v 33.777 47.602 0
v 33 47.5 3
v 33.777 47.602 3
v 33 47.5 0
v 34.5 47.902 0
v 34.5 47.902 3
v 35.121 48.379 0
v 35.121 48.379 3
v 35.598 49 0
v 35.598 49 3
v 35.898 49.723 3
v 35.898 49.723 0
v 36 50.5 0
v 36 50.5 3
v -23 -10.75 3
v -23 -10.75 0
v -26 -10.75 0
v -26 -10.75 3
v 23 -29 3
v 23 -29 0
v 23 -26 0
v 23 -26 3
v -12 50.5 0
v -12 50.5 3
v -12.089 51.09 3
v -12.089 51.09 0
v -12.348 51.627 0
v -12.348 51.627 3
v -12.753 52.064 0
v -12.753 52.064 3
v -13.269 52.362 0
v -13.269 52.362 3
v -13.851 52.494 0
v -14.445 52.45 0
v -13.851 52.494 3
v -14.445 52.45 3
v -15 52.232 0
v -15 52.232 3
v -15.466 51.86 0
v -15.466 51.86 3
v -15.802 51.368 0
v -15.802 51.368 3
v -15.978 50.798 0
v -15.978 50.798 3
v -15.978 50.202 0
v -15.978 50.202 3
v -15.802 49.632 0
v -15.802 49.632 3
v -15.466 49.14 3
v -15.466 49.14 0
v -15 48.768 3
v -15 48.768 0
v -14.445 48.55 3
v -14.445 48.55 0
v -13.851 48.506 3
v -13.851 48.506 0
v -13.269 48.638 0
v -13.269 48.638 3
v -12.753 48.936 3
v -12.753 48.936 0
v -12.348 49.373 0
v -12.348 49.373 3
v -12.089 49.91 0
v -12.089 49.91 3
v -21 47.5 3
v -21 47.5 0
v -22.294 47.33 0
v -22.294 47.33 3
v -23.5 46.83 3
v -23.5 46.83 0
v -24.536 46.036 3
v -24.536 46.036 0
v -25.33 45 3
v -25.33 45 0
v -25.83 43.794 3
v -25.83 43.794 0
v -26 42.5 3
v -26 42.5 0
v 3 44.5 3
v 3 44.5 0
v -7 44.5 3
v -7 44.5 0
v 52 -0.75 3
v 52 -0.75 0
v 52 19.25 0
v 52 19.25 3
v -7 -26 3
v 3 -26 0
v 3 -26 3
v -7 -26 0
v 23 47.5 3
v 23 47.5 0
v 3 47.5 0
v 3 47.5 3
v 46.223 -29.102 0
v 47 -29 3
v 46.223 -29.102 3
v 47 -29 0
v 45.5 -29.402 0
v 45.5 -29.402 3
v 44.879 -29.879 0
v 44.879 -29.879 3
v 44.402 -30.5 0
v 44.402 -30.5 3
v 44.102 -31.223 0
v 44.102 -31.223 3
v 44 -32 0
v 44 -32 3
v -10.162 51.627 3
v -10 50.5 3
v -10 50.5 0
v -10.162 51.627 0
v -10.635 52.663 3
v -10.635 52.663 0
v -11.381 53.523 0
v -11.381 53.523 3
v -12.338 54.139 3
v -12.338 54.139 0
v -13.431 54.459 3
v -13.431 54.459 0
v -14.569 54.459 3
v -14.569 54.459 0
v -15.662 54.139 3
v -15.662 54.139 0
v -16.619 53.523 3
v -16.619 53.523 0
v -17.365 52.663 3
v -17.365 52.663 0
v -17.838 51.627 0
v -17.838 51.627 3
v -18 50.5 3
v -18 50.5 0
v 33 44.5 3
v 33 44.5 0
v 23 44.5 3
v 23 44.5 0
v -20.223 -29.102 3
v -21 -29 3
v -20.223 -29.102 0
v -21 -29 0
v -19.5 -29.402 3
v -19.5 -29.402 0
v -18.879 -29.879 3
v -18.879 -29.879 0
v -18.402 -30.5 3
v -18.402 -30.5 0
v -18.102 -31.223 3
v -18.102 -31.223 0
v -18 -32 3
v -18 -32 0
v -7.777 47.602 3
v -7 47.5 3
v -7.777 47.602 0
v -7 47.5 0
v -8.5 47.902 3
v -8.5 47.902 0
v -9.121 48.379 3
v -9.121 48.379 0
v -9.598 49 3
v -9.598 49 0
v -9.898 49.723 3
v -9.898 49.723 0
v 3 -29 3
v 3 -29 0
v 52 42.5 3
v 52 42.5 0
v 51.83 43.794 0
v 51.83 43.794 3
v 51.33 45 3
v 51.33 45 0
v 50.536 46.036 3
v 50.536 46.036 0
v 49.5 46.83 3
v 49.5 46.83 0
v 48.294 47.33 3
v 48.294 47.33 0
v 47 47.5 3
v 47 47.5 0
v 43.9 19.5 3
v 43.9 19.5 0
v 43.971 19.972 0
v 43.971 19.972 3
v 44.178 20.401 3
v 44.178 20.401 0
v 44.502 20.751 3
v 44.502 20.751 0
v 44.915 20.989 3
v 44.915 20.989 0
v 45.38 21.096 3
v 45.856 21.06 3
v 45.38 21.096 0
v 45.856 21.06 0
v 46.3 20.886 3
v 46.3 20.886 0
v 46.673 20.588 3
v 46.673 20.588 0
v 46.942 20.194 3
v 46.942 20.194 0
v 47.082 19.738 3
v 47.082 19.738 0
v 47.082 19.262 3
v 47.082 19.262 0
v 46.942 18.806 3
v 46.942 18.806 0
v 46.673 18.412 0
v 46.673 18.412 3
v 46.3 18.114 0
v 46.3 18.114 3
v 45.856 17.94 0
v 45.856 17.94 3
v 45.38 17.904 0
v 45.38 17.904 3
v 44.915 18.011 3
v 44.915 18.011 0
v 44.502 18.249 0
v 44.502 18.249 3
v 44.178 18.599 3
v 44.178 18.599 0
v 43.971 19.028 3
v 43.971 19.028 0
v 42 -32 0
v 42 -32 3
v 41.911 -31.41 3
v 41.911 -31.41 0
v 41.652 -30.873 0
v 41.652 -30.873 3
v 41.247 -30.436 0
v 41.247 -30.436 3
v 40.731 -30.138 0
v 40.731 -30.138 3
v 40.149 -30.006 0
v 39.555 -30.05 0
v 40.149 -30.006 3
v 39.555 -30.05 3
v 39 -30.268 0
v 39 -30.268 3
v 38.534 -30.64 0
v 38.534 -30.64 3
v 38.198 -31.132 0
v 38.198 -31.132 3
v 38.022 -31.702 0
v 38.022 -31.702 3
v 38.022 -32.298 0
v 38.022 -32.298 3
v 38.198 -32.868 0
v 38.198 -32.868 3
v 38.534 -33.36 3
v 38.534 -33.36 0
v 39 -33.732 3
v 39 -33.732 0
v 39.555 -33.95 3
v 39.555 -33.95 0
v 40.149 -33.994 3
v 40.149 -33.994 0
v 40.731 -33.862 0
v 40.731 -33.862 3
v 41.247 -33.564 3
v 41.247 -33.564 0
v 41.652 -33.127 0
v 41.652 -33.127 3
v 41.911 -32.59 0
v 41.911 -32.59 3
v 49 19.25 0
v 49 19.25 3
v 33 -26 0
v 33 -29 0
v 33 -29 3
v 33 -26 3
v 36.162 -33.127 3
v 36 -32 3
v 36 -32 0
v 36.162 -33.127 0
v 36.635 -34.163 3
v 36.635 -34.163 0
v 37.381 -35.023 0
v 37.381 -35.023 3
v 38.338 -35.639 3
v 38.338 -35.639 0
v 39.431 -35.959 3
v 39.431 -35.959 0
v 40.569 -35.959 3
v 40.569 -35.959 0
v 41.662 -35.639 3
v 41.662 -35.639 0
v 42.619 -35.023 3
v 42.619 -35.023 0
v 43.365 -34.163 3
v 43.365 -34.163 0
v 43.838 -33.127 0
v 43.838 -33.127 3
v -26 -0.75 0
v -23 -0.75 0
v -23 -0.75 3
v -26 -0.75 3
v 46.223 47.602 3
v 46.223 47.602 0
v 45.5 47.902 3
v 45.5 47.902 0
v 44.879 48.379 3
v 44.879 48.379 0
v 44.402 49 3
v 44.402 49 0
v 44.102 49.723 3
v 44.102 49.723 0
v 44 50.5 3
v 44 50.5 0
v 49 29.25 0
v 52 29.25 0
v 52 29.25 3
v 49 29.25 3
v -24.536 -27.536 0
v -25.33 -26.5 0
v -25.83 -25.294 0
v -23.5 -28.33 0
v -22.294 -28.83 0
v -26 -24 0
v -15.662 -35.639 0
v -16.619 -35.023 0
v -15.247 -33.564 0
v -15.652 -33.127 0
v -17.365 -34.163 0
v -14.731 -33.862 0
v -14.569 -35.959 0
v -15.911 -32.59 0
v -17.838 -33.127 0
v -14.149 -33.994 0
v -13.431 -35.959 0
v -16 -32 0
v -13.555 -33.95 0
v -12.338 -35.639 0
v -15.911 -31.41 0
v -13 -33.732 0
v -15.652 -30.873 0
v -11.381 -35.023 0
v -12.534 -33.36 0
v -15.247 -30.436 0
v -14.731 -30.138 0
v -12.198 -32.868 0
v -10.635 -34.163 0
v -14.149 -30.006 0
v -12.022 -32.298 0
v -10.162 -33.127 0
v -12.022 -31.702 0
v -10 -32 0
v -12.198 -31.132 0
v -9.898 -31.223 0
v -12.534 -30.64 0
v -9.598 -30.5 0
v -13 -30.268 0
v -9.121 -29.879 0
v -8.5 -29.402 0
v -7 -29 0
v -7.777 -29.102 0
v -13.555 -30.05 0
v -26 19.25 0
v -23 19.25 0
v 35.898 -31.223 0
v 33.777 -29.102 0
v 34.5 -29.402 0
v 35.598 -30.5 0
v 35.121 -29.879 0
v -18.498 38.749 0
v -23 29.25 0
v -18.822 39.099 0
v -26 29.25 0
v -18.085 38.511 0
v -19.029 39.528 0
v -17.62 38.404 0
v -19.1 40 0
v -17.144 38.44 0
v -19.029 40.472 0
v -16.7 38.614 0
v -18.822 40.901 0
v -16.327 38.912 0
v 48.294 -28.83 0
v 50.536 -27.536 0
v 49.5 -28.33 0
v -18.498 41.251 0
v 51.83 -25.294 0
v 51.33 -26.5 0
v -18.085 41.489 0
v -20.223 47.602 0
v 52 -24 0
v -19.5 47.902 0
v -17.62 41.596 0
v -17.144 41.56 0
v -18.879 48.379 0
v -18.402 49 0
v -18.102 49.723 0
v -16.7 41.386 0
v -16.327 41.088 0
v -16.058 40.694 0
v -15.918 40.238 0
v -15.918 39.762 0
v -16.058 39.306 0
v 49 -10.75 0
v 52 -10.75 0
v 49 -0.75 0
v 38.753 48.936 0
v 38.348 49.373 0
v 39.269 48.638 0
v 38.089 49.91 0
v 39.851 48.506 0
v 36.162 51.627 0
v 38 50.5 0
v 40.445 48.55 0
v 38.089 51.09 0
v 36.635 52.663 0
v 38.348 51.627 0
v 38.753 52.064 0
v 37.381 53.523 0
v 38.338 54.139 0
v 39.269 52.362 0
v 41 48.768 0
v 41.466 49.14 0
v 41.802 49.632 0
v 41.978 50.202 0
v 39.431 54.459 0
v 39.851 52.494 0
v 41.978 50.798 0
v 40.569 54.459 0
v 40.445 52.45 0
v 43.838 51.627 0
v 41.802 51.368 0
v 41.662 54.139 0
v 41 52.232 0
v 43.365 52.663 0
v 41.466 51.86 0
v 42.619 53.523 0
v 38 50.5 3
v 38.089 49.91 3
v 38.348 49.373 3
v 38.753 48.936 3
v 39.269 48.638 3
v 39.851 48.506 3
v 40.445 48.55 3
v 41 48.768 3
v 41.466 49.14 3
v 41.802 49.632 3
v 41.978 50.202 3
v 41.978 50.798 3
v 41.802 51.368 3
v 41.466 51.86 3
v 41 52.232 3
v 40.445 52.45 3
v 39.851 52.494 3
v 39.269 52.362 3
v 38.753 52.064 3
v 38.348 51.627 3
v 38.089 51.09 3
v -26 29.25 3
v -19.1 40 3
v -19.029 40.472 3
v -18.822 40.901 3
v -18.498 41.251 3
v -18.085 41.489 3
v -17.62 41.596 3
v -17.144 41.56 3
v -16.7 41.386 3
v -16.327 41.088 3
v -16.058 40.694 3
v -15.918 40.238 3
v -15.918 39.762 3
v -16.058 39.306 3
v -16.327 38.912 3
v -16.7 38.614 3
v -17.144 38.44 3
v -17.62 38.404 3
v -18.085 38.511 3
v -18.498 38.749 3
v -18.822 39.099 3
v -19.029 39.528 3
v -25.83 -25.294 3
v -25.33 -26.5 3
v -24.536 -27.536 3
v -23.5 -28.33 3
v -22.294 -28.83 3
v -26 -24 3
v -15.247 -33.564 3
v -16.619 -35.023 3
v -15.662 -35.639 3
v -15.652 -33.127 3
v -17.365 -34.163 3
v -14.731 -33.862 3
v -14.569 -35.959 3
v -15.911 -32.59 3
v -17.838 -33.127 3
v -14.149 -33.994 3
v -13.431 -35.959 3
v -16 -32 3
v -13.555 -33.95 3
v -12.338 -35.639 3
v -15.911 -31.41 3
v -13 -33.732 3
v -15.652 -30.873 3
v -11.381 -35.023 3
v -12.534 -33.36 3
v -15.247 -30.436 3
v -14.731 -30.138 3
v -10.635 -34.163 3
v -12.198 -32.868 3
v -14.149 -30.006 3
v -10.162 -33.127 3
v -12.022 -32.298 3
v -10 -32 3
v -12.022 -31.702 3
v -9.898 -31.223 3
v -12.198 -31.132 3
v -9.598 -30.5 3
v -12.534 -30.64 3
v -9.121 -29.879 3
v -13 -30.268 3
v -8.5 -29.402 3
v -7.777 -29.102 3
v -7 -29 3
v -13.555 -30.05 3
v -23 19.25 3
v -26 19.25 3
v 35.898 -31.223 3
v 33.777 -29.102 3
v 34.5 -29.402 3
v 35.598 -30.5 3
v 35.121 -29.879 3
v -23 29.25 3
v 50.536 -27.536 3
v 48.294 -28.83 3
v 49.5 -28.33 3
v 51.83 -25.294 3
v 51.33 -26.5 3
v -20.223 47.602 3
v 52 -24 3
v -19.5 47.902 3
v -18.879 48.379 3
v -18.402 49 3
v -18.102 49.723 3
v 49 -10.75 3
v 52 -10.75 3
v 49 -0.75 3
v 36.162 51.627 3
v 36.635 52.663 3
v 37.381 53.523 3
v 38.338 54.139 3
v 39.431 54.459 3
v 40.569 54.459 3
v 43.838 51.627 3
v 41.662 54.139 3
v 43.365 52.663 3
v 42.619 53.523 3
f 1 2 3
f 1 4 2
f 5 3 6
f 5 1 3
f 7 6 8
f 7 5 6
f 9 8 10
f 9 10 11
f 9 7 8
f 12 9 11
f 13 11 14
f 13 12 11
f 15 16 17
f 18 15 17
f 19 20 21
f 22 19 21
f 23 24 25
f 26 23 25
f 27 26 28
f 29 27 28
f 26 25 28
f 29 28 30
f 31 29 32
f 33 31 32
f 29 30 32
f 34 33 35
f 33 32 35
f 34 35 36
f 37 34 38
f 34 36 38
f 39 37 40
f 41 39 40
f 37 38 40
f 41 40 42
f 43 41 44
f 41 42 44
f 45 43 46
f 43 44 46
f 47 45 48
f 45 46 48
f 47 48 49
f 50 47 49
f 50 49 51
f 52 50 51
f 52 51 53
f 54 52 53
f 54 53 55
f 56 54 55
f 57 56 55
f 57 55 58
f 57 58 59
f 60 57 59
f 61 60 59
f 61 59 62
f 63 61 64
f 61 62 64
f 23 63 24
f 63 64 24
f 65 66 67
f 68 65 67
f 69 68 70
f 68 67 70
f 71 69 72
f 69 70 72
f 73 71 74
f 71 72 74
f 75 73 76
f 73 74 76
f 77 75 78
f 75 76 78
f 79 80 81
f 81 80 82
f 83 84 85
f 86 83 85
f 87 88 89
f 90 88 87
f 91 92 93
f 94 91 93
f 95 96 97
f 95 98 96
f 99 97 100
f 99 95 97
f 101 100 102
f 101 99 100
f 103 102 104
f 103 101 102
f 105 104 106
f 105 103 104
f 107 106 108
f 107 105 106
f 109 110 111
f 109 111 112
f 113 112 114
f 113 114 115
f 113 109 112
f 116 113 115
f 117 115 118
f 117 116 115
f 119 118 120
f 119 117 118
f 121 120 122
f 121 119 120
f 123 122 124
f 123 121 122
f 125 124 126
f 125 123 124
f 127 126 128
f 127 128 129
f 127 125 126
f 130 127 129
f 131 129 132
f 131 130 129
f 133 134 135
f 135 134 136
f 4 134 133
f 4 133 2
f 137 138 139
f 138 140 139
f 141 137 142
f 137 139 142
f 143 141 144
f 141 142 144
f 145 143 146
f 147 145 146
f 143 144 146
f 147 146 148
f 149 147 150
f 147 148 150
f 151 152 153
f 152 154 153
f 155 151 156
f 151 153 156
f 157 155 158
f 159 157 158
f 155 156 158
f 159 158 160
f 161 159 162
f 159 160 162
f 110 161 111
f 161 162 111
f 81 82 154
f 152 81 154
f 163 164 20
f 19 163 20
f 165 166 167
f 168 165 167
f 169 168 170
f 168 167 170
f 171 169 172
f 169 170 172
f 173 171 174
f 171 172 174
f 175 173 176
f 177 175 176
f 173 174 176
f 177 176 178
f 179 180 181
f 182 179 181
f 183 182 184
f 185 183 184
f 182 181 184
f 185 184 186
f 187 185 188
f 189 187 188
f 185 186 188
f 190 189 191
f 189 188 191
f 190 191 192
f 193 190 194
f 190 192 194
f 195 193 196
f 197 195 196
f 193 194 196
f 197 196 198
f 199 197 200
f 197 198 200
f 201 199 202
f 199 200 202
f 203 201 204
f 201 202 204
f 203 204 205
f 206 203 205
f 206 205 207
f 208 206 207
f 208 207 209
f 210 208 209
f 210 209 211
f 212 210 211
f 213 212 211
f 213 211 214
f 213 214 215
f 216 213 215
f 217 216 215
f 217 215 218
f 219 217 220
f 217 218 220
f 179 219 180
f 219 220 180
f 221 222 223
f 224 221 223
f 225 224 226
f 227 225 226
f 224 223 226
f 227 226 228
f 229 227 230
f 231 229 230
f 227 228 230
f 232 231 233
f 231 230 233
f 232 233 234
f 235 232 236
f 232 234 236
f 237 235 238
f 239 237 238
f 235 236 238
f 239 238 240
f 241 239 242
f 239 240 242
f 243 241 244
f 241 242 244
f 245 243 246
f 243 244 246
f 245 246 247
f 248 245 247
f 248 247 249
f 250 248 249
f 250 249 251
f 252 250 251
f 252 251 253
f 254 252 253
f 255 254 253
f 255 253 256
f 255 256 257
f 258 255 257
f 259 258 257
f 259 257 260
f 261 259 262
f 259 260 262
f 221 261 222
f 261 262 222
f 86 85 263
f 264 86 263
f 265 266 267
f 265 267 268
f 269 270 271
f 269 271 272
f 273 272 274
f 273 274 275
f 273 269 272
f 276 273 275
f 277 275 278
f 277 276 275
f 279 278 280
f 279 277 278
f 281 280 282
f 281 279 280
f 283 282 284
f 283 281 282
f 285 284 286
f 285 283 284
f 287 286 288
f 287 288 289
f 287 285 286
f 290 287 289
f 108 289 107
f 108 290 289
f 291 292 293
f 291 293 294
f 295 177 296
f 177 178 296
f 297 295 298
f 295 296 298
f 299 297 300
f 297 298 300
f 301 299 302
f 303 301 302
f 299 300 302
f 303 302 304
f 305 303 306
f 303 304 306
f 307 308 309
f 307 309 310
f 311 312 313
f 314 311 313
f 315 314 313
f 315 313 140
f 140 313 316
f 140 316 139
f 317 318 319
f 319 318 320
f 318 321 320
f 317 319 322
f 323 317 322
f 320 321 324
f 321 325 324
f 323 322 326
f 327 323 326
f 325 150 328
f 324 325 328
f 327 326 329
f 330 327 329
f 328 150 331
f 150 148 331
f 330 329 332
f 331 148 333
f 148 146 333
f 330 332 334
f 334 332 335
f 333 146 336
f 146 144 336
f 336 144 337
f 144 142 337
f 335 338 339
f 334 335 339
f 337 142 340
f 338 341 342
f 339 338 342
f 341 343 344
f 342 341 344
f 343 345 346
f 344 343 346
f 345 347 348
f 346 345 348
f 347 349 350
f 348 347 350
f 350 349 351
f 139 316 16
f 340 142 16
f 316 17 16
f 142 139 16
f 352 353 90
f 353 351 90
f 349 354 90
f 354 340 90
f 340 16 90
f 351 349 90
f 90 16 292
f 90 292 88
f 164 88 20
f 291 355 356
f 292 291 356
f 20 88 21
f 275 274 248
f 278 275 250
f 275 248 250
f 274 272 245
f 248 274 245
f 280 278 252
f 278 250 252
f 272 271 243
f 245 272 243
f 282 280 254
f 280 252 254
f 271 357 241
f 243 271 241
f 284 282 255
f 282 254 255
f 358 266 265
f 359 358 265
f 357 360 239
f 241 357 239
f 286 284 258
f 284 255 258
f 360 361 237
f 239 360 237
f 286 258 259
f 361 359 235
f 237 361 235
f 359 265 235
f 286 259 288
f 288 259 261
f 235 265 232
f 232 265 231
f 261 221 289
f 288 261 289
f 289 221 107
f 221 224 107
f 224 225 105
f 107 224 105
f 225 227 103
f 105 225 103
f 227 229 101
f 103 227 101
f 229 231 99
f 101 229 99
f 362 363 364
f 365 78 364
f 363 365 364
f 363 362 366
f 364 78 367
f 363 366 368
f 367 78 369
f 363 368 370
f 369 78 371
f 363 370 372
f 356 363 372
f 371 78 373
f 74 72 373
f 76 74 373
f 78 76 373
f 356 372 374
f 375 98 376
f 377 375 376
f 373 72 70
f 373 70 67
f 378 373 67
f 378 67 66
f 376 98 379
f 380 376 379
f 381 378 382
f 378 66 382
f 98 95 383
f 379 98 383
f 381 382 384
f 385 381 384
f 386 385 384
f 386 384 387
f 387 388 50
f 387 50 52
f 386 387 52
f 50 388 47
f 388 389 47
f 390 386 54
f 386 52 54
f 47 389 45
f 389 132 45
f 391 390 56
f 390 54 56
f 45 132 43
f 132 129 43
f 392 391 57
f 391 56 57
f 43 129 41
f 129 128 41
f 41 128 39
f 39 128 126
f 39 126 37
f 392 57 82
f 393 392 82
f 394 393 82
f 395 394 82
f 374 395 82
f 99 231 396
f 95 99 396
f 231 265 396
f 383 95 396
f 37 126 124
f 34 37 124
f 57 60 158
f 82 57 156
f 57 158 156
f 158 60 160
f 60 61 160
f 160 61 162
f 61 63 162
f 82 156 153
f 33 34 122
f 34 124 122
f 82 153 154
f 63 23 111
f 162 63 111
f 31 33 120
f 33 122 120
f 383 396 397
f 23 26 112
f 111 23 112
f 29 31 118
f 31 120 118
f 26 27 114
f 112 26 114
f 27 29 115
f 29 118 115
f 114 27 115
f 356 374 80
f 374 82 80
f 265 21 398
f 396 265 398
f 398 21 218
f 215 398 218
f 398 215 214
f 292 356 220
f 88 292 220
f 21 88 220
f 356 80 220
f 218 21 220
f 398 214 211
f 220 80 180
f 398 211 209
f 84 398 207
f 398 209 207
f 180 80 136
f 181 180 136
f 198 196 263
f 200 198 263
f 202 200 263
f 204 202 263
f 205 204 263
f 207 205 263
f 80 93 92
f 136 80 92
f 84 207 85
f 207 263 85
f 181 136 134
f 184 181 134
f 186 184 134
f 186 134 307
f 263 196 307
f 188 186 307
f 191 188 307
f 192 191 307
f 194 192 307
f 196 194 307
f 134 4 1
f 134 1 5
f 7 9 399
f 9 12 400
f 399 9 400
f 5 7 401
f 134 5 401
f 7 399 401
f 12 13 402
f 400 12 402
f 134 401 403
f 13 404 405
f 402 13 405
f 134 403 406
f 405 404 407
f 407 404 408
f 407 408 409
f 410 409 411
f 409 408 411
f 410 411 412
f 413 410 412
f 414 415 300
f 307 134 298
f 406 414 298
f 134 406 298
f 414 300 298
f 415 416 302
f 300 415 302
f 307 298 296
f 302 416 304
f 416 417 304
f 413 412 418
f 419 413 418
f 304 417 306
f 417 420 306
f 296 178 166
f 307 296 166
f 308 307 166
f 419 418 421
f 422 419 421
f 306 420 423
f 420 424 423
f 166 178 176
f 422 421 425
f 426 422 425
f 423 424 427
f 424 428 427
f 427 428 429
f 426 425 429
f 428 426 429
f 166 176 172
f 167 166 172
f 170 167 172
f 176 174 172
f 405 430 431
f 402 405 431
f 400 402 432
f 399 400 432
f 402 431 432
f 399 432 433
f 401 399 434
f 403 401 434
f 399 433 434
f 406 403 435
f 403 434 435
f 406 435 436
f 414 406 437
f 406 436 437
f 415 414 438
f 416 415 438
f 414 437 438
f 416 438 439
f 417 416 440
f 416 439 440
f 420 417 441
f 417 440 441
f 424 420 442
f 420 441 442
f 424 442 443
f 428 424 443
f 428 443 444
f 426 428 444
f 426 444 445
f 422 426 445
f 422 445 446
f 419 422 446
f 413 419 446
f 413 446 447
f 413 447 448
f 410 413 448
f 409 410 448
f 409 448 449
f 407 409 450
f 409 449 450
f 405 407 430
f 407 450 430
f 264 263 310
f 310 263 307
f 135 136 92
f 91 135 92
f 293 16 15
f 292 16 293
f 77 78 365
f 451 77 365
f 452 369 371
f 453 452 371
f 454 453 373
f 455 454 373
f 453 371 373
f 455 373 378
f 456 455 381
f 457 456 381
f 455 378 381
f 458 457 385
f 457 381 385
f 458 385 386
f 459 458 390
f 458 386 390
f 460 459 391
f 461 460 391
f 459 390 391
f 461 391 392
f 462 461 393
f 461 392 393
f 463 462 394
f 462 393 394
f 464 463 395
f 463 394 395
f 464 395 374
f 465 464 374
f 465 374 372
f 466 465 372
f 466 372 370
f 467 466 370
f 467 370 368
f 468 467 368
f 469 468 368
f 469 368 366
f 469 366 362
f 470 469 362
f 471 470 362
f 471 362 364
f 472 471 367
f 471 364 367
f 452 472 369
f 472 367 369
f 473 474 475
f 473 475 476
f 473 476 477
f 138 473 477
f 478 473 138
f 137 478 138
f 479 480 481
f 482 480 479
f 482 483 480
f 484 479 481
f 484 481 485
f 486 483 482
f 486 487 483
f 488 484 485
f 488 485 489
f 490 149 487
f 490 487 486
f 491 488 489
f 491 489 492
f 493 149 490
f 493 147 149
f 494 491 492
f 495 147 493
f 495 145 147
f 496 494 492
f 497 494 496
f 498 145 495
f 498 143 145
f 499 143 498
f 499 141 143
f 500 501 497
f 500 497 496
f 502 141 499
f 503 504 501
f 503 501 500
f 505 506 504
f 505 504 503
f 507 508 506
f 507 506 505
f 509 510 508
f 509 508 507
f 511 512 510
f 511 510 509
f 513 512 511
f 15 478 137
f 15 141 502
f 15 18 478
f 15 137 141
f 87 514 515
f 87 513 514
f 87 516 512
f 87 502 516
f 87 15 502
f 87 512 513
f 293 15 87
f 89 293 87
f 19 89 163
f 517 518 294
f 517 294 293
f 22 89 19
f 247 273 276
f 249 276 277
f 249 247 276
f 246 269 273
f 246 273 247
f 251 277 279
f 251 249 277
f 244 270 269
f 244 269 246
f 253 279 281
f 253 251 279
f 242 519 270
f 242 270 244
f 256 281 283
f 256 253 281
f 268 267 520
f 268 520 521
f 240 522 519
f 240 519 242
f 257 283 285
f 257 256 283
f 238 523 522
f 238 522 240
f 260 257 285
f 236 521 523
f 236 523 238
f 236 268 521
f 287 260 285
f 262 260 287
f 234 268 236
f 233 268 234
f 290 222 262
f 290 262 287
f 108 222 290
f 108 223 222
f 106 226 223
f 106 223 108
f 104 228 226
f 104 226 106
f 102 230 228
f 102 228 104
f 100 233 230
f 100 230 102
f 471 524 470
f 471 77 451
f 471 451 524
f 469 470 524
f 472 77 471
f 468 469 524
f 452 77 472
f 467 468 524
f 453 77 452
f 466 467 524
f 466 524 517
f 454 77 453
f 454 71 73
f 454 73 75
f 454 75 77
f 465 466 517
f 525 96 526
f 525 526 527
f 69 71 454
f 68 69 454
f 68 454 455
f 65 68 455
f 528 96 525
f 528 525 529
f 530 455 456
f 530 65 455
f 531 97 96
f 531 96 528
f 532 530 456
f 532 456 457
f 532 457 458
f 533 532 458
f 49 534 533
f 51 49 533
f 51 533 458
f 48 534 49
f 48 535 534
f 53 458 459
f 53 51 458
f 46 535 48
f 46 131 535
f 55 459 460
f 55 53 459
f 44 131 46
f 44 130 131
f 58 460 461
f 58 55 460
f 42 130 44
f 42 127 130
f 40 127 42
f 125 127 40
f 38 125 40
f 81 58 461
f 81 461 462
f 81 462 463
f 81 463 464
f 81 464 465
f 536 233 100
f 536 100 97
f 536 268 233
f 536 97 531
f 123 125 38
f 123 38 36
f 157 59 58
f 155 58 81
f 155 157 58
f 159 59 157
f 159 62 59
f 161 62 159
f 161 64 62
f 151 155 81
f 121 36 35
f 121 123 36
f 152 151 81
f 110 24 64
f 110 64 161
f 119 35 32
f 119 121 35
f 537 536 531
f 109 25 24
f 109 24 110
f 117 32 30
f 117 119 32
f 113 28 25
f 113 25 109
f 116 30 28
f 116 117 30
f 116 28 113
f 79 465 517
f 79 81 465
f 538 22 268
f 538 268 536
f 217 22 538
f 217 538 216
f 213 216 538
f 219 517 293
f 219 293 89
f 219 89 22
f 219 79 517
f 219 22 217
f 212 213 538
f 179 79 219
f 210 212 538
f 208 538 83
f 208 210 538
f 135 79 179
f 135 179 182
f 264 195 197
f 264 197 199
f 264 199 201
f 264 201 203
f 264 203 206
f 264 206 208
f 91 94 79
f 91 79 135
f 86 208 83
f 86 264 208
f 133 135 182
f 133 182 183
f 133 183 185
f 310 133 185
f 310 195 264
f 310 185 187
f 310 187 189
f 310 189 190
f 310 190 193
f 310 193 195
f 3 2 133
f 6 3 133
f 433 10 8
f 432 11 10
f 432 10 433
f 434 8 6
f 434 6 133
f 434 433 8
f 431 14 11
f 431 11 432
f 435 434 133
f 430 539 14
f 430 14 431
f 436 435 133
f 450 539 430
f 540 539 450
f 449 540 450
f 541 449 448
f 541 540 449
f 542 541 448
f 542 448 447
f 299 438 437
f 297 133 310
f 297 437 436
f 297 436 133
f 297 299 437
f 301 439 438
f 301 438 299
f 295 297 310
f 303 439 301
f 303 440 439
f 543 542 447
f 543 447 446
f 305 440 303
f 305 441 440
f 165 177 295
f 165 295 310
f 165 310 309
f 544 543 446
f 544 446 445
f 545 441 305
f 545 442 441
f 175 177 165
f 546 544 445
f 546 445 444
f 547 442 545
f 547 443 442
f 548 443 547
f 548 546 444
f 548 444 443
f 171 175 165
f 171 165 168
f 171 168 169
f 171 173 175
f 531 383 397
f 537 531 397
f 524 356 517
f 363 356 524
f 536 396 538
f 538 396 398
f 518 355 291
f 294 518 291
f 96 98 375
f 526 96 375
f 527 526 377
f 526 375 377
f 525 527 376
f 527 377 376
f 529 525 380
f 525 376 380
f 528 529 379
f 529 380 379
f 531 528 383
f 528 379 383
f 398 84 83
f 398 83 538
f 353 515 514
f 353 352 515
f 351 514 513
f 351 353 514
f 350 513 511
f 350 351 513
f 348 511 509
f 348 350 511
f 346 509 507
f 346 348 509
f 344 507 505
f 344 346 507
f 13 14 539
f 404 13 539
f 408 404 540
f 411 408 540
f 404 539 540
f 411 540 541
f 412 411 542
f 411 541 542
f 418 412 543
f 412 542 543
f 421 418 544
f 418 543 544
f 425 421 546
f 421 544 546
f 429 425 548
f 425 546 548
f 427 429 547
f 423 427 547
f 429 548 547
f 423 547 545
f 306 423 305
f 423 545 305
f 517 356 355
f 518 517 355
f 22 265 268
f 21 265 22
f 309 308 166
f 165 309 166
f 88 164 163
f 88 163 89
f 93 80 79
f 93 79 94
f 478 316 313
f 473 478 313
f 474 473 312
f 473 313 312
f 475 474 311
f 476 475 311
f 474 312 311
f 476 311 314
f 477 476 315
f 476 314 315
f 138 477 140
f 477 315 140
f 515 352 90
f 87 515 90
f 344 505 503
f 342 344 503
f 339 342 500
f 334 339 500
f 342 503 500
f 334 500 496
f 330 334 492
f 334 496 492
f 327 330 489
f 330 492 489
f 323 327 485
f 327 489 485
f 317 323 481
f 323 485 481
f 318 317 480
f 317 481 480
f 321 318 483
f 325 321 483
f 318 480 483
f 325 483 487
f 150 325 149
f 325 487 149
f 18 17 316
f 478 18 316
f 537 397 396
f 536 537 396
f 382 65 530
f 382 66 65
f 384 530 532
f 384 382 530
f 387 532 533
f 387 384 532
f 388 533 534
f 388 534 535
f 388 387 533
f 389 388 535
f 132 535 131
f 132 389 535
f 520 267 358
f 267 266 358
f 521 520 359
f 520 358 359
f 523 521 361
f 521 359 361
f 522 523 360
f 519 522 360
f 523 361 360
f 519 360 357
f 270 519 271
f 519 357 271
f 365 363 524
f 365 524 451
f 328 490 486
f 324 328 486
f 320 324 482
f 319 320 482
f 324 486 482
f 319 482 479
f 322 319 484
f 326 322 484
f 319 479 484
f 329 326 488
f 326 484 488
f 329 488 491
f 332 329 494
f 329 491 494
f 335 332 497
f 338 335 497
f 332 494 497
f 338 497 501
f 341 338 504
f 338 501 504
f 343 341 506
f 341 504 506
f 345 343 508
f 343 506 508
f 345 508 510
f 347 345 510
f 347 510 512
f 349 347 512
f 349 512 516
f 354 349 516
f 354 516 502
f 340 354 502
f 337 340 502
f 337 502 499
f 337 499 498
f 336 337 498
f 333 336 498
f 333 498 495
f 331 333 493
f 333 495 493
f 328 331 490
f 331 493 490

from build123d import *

# Parameters (mm, degrees)
BOSS_EXTRUDE1_DEPTH = 3
SKETCH3_R           = 1.6
CUT_EXTRUDE1_DEPTH  = 3
SKETCH4_W           = 3
SKETCH4_H           = 10
SKETCH4_W_2         = 10
SKETCH4_H_2         = 3
CUT_EXTRUDE2_DEPTH  = 3
SKETCH5_R           = 2
BOSS_EXTRUDE2_DEPTH = 3
FILLET1_R           = 3


with BuildPart() as part:
    # Sketch1 → Boss-Extrude1 (new body)
    with BuildSketch(Plane.XY):
        with BuildLine():
            Line((52, -24), (52, 42.5))
            ThreePointArc((52, 42.5), (50.535533906, 46.035533906), (47, 47.5))
            Line((47, 47.5), (-21, 47.5))
            ThreePointArc((-21, 47.5), (-24.535533906, 46.035533906), (-26, 42.5))
            Line((-26, 42.5), (-26, -24))
            ThreePointArc((-26, -24), (-24.535533906, -27.535533906), (-21, -29))
            Line((-21, -29), (47, -29))
            ThreePointArc((47, -29), (50.535533906, -27.535533906), (52, -24))
        make_face()
    extrude(amount=BOSS_EXTRUDE1_DEPTH)

    # Sketch3 → Cut-Extrude1 (cut)
    with BuildSketch(Plane(origin=(0, 0, 0), x_dir=(-1, 0, 0), z_dir=(0, 0, -1))):
        with Locations((17.5, 40)):
            Circle(SKETCH3_R)
        with Locations((-45.5, 19.5)):
            Circle(SKETCH3_R)
    extrude(amount=-CUT_EXTRUDE1_DEPTH, mode=Mode.SUBTRACT)

    # Sketch4 → Cut-Extrude2 (cut)
    with BuildSketch(Plane(origin=(0, 0, 0), x_dir=(-1, 0, 0), z_dir=(0, 0, -1))):
        with Locations((24.5, 24.25)):
            Rectangle(SKETCH4_W, SKETCH4_H)
        with Locations((24.5, -5.75)):
            Rectangle(SKETCH4_W, SKETCH4_H)
        with Locations((-50.5, -5.75)):
            Rectangle(SKETCH4_W, SKETCH4_H)
        with Locations((-50.5, 24.25)):
            Rectangle(SKETCH4_W, SKETCH4_H)
        with Locations((2, 46)):
            Rectangle(SKETCH4_W_2, SKETCH4_H_2)
        with Locations((-28, 46)):
            Rectangle(SKETCH4_W_2, SKETCH4_H_2)
        with Locations((-28, -27.5)):
            Rectangle(SKETCH4_W_2, SKETCH4_H_2)
        with Locations((2, -27.5)):
            Rectangle(SKETCH4_W_2, SKETCH4_H_2)
    extrude(amount=-CUT_EXTRUDE2_DEPTH, mode=Mode.SUBTRACT)

    # Sketch5 → Boss-Extrude2 (add)
    # profile 1 of 4: a face of its own
    with BuildSketch(Plane.XY.offset(3)):
        with BuildLine():
            Line((-18, 47.5), (-10, 47.5))
            Line((-10, 47.5), (-10, 50.5))
            ThreePointArc((-10, 50.5), (-14, 54.5), (-18, 50.5))
            Line((-18, 50.5), (-18, 47.5))
        make_face()
        with Locations((-14, 50.5)):
            Circle(SKETCH5_R, mode=Mode.SUBTRACT)
    # profile 2 of 4: a face of its own
    with BuildSketch(Plane.XY.offset(3)):
        with BuildLine():
            Line((36, 47.5), (36, 50.5))
            ThreePointArc((36, 50.5), (40, 54.5), (44, 50.5))
            Line((44, 50.5), (44, 47.5))
            Line((44, 47.5), (36, 47.5))
        make_face()
        with Locations(Location((40, 50.5, 0), (0, 0, 180))):
            Circle(SKETCH5_R, mode=Mode.SUBTRACT)
    # profile 3 of 4: a face of its own
    with BuildSketch(Plane.XY.offset(3)):
        with BuildLine():
            Line((44, -29), (36, -29))
            Line((36, -29), (36, -32))
            ThreePointArc((36, -32), (40, -36), (44, -32))
            Line((44, -32), (44, -29))
        make_face()
        with Locations((40, -32)):
            Circle(SKETCH5_R, mode=Mode.SUBTRACT)
    # profile 4 of 4: a face of its own
    with BuildSketch(Plane.XY.offset(3)):
        with BuildLine():
            Line((-10, -29), (-10, -32))
            ThreePointArc((-10, -32), (-14, -36), (-18, -32))
            Line((-18, -32), (-18, -29))
            Line((-18, -29), (-10, -29))
        make_face()
        with Locations(Location((-14, -32, 0), (0, 0, 180))):
            Circle(SKETCH5_R, mode=Mode.SUBTRACT)
    extrude(amount=-BOSS_EXTRUDE2_DEPTH)

    # Fillet1
    fillet1_edges = [part.edges().sort_by_distance(p)[0] for p in [
        (-10, 47.5, 1.5),
        (-18, 47.5, 1.5),
        (36, 47.5, 1.5),
        (44, 47.5, 1.5),
        (44, -29, 1.5),
        (36, -29, 1.5),
        (-10, -29, 1.5),
        (-18, -29, 1.5),
    ]]
    fillet(fillet1_edges, radius=FILLET1_R - 0.0001)  # a hair under: the kernel refuses the full size


solid = part.part
